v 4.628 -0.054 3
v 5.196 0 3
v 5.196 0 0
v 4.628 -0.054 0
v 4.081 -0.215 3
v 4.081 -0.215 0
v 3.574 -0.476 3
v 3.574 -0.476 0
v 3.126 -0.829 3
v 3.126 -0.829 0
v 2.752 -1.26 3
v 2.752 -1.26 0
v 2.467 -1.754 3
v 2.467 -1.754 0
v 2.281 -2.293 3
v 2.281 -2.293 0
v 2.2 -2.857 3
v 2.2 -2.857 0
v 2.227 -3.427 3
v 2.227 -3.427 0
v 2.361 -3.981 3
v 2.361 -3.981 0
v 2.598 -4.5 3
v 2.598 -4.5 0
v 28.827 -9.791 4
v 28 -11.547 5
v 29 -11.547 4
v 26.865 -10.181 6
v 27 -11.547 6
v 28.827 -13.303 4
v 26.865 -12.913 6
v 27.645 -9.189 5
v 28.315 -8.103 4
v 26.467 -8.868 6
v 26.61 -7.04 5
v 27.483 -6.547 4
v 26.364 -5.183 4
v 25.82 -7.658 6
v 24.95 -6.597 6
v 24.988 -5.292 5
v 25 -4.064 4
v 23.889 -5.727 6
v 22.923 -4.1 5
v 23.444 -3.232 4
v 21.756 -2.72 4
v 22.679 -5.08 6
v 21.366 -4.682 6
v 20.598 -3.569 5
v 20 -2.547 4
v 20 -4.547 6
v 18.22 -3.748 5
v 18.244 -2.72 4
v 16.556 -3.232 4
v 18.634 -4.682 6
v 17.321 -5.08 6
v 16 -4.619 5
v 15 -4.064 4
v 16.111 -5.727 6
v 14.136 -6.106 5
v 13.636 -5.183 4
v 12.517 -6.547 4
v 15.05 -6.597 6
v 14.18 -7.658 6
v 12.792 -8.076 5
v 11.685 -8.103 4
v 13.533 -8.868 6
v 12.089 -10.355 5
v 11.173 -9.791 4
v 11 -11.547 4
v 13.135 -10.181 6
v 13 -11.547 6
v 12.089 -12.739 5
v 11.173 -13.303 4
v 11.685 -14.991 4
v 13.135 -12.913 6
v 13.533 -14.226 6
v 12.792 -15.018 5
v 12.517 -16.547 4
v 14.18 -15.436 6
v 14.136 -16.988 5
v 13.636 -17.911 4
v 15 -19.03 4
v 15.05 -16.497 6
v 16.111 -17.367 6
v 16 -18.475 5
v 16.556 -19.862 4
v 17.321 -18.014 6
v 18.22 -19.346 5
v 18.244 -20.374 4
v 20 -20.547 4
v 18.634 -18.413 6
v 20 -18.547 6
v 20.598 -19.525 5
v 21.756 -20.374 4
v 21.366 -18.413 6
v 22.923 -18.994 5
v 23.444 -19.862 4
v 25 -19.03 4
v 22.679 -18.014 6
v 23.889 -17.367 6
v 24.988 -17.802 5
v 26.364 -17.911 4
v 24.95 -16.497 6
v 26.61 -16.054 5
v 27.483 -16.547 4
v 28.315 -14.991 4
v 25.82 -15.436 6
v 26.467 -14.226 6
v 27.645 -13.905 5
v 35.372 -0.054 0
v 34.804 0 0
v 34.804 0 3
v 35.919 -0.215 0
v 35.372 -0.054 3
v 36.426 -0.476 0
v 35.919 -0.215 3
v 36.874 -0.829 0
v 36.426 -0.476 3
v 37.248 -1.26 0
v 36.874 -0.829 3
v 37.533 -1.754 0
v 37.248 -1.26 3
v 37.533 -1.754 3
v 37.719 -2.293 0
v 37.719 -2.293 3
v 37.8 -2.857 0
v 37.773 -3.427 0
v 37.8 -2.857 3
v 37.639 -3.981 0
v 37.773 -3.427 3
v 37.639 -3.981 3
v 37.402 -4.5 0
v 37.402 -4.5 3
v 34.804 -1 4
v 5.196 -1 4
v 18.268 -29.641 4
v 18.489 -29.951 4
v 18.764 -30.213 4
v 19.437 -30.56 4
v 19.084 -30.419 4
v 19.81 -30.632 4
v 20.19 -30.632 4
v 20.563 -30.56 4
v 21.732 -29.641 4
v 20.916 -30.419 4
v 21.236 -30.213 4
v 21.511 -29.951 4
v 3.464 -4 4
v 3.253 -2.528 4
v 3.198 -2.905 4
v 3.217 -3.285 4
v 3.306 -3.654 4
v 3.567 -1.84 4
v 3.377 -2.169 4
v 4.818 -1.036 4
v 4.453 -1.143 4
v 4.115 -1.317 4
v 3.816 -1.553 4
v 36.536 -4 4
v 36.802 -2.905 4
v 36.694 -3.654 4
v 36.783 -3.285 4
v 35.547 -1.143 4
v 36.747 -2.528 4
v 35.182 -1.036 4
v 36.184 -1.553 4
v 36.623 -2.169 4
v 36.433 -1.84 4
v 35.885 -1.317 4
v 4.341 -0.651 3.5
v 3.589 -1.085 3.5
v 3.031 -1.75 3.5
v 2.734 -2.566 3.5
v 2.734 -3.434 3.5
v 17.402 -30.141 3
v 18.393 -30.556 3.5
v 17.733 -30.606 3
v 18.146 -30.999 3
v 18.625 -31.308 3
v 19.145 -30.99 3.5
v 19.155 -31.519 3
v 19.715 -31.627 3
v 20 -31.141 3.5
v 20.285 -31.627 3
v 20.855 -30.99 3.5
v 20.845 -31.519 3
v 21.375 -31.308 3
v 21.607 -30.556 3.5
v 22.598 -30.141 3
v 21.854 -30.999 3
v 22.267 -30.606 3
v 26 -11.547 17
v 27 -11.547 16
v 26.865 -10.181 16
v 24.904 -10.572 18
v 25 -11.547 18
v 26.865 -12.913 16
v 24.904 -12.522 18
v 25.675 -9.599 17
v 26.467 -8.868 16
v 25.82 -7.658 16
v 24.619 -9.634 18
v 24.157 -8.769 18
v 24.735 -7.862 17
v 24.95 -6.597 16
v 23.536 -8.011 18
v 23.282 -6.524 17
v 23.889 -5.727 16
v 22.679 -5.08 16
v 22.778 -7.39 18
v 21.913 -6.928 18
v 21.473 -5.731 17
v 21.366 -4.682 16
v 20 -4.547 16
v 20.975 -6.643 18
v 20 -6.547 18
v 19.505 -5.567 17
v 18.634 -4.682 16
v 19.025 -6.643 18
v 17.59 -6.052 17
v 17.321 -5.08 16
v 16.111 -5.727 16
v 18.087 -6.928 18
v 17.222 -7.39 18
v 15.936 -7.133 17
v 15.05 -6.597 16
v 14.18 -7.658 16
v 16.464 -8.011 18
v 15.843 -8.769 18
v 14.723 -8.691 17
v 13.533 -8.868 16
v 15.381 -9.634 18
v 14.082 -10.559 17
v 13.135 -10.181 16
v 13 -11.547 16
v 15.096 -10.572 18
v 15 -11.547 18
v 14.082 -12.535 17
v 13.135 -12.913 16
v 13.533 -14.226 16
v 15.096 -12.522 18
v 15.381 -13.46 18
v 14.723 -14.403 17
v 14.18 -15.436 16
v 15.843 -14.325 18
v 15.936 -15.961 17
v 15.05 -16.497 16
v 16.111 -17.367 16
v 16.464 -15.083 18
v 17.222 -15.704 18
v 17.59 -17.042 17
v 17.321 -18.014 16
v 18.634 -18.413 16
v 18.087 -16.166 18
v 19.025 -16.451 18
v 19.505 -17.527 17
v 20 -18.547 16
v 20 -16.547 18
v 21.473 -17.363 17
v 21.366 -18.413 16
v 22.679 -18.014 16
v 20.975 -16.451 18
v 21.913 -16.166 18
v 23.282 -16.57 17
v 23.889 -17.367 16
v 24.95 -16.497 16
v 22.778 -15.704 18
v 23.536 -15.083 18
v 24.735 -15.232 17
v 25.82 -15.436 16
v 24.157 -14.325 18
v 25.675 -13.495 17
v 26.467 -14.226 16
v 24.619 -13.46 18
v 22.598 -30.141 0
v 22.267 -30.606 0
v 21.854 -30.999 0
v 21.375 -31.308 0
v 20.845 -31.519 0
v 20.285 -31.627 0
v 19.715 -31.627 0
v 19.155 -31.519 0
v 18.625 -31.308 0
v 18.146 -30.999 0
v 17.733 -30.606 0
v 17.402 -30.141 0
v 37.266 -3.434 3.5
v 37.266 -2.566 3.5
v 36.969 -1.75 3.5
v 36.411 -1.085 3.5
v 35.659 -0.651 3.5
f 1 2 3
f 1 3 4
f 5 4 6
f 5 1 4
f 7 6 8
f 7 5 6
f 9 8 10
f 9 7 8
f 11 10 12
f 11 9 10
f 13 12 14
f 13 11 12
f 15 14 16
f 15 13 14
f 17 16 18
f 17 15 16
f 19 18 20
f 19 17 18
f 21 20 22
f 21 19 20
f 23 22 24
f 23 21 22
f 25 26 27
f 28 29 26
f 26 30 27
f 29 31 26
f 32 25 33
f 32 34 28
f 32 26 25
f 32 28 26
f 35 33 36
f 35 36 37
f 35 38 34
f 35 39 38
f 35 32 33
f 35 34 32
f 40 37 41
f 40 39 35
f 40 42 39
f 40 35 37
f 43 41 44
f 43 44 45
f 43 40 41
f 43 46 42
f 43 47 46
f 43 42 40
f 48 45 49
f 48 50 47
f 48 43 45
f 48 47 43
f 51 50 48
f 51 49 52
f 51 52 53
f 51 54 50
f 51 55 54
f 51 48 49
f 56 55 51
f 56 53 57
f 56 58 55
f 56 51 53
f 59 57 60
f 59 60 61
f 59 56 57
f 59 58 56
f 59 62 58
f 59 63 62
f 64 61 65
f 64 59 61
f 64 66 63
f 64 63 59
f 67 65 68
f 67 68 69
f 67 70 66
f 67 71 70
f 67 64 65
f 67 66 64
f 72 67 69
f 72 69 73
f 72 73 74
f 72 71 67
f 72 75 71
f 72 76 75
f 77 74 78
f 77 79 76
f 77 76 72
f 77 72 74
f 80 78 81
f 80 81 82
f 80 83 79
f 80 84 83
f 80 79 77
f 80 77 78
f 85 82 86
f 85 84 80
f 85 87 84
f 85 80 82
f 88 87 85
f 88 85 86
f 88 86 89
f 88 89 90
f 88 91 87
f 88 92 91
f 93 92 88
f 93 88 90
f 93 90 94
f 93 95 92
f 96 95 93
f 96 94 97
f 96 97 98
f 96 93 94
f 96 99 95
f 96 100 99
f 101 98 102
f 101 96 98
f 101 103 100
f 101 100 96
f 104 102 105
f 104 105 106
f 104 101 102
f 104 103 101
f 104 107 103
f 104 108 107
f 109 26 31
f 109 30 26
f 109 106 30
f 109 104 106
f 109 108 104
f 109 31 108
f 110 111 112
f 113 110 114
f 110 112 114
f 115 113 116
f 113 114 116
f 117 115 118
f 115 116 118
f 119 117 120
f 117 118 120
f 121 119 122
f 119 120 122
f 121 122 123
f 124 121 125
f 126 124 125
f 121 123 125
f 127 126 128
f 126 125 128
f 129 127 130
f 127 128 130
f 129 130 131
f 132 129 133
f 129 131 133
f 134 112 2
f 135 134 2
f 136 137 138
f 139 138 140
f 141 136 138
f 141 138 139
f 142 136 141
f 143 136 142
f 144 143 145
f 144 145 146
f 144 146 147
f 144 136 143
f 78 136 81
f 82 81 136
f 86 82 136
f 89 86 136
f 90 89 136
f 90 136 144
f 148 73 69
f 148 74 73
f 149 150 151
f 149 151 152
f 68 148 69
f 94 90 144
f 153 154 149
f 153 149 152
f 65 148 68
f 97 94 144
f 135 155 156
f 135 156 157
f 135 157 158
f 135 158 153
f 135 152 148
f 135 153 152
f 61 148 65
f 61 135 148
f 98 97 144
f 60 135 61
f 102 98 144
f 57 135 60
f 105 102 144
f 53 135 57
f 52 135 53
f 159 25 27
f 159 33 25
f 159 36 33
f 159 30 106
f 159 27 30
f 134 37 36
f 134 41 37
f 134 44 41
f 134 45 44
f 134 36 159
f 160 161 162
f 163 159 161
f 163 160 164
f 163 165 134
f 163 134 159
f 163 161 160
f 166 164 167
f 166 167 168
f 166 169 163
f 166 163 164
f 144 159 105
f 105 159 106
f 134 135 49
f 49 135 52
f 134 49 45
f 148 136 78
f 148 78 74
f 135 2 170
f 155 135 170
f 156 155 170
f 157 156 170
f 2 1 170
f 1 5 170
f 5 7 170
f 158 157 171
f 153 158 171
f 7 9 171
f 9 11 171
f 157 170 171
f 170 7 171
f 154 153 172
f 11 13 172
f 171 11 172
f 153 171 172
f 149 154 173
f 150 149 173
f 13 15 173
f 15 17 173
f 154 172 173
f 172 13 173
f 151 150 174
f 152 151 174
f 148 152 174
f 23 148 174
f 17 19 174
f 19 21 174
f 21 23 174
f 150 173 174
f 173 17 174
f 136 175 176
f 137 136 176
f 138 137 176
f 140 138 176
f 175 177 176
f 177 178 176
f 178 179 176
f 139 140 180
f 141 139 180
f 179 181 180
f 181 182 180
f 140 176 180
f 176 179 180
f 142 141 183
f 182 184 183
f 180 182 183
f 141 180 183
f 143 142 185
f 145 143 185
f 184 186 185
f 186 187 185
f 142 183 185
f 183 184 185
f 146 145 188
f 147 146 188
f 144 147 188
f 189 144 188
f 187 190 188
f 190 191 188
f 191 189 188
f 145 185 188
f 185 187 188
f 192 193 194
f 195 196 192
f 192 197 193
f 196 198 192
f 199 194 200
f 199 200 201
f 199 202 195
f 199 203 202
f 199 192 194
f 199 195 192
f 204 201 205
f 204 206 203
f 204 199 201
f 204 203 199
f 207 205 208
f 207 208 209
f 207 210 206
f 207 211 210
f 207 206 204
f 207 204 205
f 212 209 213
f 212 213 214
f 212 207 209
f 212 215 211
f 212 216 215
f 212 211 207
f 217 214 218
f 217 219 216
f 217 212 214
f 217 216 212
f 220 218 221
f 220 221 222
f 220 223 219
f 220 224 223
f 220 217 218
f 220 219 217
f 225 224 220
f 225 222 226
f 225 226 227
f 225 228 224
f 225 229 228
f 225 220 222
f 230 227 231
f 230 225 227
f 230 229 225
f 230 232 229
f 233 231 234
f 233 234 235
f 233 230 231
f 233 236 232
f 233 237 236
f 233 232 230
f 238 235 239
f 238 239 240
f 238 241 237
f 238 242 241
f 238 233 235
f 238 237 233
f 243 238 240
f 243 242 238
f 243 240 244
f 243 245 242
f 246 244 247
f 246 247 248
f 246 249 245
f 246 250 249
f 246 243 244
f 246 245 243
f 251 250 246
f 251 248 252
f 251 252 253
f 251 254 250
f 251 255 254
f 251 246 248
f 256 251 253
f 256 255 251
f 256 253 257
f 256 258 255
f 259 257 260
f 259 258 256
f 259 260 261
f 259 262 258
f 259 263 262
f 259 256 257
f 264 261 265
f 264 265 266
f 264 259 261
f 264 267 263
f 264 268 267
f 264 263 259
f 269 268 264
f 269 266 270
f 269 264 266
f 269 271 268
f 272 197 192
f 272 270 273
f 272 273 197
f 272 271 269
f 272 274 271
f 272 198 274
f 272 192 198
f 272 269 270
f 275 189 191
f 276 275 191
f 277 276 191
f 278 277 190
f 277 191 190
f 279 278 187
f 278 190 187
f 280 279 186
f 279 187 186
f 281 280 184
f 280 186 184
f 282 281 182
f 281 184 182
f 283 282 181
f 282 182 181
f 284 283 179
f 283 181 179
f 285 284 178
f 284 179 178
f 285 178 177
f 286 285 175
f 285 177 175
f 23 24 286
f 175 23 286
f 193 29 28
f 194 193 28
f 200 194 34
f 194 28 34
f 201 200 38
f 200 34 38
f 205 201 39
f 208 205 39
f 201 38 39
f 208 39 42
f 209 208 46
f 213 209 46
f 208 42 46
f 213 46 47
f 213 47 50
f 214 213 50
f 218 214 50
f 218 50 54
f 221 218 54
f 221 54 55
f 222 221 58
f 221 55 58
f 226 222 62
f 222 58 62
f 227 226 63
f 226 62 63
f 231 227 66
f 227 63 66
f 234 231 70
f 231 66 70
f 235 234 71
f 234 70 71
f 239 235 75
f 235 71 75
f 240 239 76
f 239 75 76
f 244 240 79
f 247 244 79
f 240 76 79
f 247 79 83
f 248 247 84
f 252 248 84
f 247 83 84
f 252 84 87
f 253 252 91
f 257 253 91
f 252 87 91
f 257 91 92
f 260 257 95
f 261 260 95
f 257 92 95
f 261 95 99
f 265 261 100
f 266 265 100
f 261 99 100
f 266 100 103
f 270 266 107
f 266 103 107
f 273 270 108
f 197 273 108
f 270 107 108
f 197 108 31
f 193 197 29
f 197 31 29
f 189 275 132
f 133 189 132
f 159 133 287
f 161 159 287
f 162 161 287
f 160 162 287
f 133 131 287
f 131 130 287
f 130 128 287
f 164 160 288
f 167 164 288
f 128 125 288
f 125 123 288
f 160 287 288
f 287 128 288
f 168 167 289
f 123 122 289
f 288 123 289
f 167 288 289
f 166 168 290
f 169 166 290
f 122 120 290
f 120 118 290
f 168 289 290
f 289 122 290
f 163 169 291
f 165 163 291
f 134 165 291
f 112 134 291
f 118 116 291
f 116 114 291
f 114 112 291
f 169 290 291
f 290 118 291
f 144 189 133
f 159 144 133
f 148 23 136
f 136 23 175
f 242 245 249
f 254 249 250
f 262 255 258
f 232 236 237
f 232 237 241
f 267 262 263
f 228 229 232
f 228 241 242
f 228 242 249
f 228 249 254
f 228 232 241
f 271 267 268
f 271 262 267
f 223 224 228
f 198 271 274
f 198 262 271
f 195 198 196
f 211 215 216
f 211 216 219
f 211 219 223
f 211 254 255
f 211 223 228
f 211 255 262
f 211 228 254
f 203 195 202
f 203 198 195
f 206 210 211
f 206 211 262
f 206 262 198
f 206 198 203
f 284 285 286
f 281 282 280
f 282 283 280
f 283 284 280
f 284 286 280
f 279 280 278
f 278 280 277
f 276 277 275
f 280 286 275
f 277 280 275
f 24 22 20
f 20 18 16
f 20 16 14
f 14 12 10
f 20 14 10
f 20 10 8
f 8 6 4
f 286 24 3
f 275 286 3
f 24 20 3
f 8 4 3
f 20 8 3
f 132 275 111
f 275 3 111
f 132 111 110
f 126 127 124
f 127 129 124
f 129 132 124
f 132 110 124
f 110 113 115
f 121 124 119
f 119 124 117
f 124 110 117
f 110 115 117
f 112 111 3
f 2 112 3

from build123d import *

# Parameters (mm, degrees)
F1_DEPTH = 4
F2_R     = 7
F3_DEPTH = 14
F4_R     = 3
F5_SIZE  = 1
F6_SIZE  = 2


with BuildPart() as f1:
    # F0 (on Top) → F1 (new body)
    with BuildSketch(Plane.XY):
        Polygon((40, 0), (0, 0), (20, -34.641016), align=None)
    extrude(amount=F1_DEPTH)

    # F2 (on face) → F3 (join)
    with BuildSketch(Plane.XY.offset(4)):
        with Locations((20, -11.547005)):
            Circle(F2_R)
    extrude(amount=F3_DEPTH)

    # F4
    f4_edges = [f1.edges().sort_by_distance(p)[0] for p in [
        (20, -34.641016, 2),
        (40, 0, 2),
        (0, 0, 2),
    ]]
    fillet(f4_edges, radius=F4_R)

    # F5
    f5_edges = [f1.edges().sort_by_distance(p)[0] for p in [
        (30, -17.320508, 4),
    ]]
    chamfer(f5_edges, length=F5_SIZE)

    # F6
    f6_edges = [f1.edges().sort_by_distance(p)[0] for p in [
        (13, -11.547005, 18),
        (13, -11.547005, 4),
    ]]
    chamfer(f6_edges, length=F6_SIZE)


solid = f1.part
